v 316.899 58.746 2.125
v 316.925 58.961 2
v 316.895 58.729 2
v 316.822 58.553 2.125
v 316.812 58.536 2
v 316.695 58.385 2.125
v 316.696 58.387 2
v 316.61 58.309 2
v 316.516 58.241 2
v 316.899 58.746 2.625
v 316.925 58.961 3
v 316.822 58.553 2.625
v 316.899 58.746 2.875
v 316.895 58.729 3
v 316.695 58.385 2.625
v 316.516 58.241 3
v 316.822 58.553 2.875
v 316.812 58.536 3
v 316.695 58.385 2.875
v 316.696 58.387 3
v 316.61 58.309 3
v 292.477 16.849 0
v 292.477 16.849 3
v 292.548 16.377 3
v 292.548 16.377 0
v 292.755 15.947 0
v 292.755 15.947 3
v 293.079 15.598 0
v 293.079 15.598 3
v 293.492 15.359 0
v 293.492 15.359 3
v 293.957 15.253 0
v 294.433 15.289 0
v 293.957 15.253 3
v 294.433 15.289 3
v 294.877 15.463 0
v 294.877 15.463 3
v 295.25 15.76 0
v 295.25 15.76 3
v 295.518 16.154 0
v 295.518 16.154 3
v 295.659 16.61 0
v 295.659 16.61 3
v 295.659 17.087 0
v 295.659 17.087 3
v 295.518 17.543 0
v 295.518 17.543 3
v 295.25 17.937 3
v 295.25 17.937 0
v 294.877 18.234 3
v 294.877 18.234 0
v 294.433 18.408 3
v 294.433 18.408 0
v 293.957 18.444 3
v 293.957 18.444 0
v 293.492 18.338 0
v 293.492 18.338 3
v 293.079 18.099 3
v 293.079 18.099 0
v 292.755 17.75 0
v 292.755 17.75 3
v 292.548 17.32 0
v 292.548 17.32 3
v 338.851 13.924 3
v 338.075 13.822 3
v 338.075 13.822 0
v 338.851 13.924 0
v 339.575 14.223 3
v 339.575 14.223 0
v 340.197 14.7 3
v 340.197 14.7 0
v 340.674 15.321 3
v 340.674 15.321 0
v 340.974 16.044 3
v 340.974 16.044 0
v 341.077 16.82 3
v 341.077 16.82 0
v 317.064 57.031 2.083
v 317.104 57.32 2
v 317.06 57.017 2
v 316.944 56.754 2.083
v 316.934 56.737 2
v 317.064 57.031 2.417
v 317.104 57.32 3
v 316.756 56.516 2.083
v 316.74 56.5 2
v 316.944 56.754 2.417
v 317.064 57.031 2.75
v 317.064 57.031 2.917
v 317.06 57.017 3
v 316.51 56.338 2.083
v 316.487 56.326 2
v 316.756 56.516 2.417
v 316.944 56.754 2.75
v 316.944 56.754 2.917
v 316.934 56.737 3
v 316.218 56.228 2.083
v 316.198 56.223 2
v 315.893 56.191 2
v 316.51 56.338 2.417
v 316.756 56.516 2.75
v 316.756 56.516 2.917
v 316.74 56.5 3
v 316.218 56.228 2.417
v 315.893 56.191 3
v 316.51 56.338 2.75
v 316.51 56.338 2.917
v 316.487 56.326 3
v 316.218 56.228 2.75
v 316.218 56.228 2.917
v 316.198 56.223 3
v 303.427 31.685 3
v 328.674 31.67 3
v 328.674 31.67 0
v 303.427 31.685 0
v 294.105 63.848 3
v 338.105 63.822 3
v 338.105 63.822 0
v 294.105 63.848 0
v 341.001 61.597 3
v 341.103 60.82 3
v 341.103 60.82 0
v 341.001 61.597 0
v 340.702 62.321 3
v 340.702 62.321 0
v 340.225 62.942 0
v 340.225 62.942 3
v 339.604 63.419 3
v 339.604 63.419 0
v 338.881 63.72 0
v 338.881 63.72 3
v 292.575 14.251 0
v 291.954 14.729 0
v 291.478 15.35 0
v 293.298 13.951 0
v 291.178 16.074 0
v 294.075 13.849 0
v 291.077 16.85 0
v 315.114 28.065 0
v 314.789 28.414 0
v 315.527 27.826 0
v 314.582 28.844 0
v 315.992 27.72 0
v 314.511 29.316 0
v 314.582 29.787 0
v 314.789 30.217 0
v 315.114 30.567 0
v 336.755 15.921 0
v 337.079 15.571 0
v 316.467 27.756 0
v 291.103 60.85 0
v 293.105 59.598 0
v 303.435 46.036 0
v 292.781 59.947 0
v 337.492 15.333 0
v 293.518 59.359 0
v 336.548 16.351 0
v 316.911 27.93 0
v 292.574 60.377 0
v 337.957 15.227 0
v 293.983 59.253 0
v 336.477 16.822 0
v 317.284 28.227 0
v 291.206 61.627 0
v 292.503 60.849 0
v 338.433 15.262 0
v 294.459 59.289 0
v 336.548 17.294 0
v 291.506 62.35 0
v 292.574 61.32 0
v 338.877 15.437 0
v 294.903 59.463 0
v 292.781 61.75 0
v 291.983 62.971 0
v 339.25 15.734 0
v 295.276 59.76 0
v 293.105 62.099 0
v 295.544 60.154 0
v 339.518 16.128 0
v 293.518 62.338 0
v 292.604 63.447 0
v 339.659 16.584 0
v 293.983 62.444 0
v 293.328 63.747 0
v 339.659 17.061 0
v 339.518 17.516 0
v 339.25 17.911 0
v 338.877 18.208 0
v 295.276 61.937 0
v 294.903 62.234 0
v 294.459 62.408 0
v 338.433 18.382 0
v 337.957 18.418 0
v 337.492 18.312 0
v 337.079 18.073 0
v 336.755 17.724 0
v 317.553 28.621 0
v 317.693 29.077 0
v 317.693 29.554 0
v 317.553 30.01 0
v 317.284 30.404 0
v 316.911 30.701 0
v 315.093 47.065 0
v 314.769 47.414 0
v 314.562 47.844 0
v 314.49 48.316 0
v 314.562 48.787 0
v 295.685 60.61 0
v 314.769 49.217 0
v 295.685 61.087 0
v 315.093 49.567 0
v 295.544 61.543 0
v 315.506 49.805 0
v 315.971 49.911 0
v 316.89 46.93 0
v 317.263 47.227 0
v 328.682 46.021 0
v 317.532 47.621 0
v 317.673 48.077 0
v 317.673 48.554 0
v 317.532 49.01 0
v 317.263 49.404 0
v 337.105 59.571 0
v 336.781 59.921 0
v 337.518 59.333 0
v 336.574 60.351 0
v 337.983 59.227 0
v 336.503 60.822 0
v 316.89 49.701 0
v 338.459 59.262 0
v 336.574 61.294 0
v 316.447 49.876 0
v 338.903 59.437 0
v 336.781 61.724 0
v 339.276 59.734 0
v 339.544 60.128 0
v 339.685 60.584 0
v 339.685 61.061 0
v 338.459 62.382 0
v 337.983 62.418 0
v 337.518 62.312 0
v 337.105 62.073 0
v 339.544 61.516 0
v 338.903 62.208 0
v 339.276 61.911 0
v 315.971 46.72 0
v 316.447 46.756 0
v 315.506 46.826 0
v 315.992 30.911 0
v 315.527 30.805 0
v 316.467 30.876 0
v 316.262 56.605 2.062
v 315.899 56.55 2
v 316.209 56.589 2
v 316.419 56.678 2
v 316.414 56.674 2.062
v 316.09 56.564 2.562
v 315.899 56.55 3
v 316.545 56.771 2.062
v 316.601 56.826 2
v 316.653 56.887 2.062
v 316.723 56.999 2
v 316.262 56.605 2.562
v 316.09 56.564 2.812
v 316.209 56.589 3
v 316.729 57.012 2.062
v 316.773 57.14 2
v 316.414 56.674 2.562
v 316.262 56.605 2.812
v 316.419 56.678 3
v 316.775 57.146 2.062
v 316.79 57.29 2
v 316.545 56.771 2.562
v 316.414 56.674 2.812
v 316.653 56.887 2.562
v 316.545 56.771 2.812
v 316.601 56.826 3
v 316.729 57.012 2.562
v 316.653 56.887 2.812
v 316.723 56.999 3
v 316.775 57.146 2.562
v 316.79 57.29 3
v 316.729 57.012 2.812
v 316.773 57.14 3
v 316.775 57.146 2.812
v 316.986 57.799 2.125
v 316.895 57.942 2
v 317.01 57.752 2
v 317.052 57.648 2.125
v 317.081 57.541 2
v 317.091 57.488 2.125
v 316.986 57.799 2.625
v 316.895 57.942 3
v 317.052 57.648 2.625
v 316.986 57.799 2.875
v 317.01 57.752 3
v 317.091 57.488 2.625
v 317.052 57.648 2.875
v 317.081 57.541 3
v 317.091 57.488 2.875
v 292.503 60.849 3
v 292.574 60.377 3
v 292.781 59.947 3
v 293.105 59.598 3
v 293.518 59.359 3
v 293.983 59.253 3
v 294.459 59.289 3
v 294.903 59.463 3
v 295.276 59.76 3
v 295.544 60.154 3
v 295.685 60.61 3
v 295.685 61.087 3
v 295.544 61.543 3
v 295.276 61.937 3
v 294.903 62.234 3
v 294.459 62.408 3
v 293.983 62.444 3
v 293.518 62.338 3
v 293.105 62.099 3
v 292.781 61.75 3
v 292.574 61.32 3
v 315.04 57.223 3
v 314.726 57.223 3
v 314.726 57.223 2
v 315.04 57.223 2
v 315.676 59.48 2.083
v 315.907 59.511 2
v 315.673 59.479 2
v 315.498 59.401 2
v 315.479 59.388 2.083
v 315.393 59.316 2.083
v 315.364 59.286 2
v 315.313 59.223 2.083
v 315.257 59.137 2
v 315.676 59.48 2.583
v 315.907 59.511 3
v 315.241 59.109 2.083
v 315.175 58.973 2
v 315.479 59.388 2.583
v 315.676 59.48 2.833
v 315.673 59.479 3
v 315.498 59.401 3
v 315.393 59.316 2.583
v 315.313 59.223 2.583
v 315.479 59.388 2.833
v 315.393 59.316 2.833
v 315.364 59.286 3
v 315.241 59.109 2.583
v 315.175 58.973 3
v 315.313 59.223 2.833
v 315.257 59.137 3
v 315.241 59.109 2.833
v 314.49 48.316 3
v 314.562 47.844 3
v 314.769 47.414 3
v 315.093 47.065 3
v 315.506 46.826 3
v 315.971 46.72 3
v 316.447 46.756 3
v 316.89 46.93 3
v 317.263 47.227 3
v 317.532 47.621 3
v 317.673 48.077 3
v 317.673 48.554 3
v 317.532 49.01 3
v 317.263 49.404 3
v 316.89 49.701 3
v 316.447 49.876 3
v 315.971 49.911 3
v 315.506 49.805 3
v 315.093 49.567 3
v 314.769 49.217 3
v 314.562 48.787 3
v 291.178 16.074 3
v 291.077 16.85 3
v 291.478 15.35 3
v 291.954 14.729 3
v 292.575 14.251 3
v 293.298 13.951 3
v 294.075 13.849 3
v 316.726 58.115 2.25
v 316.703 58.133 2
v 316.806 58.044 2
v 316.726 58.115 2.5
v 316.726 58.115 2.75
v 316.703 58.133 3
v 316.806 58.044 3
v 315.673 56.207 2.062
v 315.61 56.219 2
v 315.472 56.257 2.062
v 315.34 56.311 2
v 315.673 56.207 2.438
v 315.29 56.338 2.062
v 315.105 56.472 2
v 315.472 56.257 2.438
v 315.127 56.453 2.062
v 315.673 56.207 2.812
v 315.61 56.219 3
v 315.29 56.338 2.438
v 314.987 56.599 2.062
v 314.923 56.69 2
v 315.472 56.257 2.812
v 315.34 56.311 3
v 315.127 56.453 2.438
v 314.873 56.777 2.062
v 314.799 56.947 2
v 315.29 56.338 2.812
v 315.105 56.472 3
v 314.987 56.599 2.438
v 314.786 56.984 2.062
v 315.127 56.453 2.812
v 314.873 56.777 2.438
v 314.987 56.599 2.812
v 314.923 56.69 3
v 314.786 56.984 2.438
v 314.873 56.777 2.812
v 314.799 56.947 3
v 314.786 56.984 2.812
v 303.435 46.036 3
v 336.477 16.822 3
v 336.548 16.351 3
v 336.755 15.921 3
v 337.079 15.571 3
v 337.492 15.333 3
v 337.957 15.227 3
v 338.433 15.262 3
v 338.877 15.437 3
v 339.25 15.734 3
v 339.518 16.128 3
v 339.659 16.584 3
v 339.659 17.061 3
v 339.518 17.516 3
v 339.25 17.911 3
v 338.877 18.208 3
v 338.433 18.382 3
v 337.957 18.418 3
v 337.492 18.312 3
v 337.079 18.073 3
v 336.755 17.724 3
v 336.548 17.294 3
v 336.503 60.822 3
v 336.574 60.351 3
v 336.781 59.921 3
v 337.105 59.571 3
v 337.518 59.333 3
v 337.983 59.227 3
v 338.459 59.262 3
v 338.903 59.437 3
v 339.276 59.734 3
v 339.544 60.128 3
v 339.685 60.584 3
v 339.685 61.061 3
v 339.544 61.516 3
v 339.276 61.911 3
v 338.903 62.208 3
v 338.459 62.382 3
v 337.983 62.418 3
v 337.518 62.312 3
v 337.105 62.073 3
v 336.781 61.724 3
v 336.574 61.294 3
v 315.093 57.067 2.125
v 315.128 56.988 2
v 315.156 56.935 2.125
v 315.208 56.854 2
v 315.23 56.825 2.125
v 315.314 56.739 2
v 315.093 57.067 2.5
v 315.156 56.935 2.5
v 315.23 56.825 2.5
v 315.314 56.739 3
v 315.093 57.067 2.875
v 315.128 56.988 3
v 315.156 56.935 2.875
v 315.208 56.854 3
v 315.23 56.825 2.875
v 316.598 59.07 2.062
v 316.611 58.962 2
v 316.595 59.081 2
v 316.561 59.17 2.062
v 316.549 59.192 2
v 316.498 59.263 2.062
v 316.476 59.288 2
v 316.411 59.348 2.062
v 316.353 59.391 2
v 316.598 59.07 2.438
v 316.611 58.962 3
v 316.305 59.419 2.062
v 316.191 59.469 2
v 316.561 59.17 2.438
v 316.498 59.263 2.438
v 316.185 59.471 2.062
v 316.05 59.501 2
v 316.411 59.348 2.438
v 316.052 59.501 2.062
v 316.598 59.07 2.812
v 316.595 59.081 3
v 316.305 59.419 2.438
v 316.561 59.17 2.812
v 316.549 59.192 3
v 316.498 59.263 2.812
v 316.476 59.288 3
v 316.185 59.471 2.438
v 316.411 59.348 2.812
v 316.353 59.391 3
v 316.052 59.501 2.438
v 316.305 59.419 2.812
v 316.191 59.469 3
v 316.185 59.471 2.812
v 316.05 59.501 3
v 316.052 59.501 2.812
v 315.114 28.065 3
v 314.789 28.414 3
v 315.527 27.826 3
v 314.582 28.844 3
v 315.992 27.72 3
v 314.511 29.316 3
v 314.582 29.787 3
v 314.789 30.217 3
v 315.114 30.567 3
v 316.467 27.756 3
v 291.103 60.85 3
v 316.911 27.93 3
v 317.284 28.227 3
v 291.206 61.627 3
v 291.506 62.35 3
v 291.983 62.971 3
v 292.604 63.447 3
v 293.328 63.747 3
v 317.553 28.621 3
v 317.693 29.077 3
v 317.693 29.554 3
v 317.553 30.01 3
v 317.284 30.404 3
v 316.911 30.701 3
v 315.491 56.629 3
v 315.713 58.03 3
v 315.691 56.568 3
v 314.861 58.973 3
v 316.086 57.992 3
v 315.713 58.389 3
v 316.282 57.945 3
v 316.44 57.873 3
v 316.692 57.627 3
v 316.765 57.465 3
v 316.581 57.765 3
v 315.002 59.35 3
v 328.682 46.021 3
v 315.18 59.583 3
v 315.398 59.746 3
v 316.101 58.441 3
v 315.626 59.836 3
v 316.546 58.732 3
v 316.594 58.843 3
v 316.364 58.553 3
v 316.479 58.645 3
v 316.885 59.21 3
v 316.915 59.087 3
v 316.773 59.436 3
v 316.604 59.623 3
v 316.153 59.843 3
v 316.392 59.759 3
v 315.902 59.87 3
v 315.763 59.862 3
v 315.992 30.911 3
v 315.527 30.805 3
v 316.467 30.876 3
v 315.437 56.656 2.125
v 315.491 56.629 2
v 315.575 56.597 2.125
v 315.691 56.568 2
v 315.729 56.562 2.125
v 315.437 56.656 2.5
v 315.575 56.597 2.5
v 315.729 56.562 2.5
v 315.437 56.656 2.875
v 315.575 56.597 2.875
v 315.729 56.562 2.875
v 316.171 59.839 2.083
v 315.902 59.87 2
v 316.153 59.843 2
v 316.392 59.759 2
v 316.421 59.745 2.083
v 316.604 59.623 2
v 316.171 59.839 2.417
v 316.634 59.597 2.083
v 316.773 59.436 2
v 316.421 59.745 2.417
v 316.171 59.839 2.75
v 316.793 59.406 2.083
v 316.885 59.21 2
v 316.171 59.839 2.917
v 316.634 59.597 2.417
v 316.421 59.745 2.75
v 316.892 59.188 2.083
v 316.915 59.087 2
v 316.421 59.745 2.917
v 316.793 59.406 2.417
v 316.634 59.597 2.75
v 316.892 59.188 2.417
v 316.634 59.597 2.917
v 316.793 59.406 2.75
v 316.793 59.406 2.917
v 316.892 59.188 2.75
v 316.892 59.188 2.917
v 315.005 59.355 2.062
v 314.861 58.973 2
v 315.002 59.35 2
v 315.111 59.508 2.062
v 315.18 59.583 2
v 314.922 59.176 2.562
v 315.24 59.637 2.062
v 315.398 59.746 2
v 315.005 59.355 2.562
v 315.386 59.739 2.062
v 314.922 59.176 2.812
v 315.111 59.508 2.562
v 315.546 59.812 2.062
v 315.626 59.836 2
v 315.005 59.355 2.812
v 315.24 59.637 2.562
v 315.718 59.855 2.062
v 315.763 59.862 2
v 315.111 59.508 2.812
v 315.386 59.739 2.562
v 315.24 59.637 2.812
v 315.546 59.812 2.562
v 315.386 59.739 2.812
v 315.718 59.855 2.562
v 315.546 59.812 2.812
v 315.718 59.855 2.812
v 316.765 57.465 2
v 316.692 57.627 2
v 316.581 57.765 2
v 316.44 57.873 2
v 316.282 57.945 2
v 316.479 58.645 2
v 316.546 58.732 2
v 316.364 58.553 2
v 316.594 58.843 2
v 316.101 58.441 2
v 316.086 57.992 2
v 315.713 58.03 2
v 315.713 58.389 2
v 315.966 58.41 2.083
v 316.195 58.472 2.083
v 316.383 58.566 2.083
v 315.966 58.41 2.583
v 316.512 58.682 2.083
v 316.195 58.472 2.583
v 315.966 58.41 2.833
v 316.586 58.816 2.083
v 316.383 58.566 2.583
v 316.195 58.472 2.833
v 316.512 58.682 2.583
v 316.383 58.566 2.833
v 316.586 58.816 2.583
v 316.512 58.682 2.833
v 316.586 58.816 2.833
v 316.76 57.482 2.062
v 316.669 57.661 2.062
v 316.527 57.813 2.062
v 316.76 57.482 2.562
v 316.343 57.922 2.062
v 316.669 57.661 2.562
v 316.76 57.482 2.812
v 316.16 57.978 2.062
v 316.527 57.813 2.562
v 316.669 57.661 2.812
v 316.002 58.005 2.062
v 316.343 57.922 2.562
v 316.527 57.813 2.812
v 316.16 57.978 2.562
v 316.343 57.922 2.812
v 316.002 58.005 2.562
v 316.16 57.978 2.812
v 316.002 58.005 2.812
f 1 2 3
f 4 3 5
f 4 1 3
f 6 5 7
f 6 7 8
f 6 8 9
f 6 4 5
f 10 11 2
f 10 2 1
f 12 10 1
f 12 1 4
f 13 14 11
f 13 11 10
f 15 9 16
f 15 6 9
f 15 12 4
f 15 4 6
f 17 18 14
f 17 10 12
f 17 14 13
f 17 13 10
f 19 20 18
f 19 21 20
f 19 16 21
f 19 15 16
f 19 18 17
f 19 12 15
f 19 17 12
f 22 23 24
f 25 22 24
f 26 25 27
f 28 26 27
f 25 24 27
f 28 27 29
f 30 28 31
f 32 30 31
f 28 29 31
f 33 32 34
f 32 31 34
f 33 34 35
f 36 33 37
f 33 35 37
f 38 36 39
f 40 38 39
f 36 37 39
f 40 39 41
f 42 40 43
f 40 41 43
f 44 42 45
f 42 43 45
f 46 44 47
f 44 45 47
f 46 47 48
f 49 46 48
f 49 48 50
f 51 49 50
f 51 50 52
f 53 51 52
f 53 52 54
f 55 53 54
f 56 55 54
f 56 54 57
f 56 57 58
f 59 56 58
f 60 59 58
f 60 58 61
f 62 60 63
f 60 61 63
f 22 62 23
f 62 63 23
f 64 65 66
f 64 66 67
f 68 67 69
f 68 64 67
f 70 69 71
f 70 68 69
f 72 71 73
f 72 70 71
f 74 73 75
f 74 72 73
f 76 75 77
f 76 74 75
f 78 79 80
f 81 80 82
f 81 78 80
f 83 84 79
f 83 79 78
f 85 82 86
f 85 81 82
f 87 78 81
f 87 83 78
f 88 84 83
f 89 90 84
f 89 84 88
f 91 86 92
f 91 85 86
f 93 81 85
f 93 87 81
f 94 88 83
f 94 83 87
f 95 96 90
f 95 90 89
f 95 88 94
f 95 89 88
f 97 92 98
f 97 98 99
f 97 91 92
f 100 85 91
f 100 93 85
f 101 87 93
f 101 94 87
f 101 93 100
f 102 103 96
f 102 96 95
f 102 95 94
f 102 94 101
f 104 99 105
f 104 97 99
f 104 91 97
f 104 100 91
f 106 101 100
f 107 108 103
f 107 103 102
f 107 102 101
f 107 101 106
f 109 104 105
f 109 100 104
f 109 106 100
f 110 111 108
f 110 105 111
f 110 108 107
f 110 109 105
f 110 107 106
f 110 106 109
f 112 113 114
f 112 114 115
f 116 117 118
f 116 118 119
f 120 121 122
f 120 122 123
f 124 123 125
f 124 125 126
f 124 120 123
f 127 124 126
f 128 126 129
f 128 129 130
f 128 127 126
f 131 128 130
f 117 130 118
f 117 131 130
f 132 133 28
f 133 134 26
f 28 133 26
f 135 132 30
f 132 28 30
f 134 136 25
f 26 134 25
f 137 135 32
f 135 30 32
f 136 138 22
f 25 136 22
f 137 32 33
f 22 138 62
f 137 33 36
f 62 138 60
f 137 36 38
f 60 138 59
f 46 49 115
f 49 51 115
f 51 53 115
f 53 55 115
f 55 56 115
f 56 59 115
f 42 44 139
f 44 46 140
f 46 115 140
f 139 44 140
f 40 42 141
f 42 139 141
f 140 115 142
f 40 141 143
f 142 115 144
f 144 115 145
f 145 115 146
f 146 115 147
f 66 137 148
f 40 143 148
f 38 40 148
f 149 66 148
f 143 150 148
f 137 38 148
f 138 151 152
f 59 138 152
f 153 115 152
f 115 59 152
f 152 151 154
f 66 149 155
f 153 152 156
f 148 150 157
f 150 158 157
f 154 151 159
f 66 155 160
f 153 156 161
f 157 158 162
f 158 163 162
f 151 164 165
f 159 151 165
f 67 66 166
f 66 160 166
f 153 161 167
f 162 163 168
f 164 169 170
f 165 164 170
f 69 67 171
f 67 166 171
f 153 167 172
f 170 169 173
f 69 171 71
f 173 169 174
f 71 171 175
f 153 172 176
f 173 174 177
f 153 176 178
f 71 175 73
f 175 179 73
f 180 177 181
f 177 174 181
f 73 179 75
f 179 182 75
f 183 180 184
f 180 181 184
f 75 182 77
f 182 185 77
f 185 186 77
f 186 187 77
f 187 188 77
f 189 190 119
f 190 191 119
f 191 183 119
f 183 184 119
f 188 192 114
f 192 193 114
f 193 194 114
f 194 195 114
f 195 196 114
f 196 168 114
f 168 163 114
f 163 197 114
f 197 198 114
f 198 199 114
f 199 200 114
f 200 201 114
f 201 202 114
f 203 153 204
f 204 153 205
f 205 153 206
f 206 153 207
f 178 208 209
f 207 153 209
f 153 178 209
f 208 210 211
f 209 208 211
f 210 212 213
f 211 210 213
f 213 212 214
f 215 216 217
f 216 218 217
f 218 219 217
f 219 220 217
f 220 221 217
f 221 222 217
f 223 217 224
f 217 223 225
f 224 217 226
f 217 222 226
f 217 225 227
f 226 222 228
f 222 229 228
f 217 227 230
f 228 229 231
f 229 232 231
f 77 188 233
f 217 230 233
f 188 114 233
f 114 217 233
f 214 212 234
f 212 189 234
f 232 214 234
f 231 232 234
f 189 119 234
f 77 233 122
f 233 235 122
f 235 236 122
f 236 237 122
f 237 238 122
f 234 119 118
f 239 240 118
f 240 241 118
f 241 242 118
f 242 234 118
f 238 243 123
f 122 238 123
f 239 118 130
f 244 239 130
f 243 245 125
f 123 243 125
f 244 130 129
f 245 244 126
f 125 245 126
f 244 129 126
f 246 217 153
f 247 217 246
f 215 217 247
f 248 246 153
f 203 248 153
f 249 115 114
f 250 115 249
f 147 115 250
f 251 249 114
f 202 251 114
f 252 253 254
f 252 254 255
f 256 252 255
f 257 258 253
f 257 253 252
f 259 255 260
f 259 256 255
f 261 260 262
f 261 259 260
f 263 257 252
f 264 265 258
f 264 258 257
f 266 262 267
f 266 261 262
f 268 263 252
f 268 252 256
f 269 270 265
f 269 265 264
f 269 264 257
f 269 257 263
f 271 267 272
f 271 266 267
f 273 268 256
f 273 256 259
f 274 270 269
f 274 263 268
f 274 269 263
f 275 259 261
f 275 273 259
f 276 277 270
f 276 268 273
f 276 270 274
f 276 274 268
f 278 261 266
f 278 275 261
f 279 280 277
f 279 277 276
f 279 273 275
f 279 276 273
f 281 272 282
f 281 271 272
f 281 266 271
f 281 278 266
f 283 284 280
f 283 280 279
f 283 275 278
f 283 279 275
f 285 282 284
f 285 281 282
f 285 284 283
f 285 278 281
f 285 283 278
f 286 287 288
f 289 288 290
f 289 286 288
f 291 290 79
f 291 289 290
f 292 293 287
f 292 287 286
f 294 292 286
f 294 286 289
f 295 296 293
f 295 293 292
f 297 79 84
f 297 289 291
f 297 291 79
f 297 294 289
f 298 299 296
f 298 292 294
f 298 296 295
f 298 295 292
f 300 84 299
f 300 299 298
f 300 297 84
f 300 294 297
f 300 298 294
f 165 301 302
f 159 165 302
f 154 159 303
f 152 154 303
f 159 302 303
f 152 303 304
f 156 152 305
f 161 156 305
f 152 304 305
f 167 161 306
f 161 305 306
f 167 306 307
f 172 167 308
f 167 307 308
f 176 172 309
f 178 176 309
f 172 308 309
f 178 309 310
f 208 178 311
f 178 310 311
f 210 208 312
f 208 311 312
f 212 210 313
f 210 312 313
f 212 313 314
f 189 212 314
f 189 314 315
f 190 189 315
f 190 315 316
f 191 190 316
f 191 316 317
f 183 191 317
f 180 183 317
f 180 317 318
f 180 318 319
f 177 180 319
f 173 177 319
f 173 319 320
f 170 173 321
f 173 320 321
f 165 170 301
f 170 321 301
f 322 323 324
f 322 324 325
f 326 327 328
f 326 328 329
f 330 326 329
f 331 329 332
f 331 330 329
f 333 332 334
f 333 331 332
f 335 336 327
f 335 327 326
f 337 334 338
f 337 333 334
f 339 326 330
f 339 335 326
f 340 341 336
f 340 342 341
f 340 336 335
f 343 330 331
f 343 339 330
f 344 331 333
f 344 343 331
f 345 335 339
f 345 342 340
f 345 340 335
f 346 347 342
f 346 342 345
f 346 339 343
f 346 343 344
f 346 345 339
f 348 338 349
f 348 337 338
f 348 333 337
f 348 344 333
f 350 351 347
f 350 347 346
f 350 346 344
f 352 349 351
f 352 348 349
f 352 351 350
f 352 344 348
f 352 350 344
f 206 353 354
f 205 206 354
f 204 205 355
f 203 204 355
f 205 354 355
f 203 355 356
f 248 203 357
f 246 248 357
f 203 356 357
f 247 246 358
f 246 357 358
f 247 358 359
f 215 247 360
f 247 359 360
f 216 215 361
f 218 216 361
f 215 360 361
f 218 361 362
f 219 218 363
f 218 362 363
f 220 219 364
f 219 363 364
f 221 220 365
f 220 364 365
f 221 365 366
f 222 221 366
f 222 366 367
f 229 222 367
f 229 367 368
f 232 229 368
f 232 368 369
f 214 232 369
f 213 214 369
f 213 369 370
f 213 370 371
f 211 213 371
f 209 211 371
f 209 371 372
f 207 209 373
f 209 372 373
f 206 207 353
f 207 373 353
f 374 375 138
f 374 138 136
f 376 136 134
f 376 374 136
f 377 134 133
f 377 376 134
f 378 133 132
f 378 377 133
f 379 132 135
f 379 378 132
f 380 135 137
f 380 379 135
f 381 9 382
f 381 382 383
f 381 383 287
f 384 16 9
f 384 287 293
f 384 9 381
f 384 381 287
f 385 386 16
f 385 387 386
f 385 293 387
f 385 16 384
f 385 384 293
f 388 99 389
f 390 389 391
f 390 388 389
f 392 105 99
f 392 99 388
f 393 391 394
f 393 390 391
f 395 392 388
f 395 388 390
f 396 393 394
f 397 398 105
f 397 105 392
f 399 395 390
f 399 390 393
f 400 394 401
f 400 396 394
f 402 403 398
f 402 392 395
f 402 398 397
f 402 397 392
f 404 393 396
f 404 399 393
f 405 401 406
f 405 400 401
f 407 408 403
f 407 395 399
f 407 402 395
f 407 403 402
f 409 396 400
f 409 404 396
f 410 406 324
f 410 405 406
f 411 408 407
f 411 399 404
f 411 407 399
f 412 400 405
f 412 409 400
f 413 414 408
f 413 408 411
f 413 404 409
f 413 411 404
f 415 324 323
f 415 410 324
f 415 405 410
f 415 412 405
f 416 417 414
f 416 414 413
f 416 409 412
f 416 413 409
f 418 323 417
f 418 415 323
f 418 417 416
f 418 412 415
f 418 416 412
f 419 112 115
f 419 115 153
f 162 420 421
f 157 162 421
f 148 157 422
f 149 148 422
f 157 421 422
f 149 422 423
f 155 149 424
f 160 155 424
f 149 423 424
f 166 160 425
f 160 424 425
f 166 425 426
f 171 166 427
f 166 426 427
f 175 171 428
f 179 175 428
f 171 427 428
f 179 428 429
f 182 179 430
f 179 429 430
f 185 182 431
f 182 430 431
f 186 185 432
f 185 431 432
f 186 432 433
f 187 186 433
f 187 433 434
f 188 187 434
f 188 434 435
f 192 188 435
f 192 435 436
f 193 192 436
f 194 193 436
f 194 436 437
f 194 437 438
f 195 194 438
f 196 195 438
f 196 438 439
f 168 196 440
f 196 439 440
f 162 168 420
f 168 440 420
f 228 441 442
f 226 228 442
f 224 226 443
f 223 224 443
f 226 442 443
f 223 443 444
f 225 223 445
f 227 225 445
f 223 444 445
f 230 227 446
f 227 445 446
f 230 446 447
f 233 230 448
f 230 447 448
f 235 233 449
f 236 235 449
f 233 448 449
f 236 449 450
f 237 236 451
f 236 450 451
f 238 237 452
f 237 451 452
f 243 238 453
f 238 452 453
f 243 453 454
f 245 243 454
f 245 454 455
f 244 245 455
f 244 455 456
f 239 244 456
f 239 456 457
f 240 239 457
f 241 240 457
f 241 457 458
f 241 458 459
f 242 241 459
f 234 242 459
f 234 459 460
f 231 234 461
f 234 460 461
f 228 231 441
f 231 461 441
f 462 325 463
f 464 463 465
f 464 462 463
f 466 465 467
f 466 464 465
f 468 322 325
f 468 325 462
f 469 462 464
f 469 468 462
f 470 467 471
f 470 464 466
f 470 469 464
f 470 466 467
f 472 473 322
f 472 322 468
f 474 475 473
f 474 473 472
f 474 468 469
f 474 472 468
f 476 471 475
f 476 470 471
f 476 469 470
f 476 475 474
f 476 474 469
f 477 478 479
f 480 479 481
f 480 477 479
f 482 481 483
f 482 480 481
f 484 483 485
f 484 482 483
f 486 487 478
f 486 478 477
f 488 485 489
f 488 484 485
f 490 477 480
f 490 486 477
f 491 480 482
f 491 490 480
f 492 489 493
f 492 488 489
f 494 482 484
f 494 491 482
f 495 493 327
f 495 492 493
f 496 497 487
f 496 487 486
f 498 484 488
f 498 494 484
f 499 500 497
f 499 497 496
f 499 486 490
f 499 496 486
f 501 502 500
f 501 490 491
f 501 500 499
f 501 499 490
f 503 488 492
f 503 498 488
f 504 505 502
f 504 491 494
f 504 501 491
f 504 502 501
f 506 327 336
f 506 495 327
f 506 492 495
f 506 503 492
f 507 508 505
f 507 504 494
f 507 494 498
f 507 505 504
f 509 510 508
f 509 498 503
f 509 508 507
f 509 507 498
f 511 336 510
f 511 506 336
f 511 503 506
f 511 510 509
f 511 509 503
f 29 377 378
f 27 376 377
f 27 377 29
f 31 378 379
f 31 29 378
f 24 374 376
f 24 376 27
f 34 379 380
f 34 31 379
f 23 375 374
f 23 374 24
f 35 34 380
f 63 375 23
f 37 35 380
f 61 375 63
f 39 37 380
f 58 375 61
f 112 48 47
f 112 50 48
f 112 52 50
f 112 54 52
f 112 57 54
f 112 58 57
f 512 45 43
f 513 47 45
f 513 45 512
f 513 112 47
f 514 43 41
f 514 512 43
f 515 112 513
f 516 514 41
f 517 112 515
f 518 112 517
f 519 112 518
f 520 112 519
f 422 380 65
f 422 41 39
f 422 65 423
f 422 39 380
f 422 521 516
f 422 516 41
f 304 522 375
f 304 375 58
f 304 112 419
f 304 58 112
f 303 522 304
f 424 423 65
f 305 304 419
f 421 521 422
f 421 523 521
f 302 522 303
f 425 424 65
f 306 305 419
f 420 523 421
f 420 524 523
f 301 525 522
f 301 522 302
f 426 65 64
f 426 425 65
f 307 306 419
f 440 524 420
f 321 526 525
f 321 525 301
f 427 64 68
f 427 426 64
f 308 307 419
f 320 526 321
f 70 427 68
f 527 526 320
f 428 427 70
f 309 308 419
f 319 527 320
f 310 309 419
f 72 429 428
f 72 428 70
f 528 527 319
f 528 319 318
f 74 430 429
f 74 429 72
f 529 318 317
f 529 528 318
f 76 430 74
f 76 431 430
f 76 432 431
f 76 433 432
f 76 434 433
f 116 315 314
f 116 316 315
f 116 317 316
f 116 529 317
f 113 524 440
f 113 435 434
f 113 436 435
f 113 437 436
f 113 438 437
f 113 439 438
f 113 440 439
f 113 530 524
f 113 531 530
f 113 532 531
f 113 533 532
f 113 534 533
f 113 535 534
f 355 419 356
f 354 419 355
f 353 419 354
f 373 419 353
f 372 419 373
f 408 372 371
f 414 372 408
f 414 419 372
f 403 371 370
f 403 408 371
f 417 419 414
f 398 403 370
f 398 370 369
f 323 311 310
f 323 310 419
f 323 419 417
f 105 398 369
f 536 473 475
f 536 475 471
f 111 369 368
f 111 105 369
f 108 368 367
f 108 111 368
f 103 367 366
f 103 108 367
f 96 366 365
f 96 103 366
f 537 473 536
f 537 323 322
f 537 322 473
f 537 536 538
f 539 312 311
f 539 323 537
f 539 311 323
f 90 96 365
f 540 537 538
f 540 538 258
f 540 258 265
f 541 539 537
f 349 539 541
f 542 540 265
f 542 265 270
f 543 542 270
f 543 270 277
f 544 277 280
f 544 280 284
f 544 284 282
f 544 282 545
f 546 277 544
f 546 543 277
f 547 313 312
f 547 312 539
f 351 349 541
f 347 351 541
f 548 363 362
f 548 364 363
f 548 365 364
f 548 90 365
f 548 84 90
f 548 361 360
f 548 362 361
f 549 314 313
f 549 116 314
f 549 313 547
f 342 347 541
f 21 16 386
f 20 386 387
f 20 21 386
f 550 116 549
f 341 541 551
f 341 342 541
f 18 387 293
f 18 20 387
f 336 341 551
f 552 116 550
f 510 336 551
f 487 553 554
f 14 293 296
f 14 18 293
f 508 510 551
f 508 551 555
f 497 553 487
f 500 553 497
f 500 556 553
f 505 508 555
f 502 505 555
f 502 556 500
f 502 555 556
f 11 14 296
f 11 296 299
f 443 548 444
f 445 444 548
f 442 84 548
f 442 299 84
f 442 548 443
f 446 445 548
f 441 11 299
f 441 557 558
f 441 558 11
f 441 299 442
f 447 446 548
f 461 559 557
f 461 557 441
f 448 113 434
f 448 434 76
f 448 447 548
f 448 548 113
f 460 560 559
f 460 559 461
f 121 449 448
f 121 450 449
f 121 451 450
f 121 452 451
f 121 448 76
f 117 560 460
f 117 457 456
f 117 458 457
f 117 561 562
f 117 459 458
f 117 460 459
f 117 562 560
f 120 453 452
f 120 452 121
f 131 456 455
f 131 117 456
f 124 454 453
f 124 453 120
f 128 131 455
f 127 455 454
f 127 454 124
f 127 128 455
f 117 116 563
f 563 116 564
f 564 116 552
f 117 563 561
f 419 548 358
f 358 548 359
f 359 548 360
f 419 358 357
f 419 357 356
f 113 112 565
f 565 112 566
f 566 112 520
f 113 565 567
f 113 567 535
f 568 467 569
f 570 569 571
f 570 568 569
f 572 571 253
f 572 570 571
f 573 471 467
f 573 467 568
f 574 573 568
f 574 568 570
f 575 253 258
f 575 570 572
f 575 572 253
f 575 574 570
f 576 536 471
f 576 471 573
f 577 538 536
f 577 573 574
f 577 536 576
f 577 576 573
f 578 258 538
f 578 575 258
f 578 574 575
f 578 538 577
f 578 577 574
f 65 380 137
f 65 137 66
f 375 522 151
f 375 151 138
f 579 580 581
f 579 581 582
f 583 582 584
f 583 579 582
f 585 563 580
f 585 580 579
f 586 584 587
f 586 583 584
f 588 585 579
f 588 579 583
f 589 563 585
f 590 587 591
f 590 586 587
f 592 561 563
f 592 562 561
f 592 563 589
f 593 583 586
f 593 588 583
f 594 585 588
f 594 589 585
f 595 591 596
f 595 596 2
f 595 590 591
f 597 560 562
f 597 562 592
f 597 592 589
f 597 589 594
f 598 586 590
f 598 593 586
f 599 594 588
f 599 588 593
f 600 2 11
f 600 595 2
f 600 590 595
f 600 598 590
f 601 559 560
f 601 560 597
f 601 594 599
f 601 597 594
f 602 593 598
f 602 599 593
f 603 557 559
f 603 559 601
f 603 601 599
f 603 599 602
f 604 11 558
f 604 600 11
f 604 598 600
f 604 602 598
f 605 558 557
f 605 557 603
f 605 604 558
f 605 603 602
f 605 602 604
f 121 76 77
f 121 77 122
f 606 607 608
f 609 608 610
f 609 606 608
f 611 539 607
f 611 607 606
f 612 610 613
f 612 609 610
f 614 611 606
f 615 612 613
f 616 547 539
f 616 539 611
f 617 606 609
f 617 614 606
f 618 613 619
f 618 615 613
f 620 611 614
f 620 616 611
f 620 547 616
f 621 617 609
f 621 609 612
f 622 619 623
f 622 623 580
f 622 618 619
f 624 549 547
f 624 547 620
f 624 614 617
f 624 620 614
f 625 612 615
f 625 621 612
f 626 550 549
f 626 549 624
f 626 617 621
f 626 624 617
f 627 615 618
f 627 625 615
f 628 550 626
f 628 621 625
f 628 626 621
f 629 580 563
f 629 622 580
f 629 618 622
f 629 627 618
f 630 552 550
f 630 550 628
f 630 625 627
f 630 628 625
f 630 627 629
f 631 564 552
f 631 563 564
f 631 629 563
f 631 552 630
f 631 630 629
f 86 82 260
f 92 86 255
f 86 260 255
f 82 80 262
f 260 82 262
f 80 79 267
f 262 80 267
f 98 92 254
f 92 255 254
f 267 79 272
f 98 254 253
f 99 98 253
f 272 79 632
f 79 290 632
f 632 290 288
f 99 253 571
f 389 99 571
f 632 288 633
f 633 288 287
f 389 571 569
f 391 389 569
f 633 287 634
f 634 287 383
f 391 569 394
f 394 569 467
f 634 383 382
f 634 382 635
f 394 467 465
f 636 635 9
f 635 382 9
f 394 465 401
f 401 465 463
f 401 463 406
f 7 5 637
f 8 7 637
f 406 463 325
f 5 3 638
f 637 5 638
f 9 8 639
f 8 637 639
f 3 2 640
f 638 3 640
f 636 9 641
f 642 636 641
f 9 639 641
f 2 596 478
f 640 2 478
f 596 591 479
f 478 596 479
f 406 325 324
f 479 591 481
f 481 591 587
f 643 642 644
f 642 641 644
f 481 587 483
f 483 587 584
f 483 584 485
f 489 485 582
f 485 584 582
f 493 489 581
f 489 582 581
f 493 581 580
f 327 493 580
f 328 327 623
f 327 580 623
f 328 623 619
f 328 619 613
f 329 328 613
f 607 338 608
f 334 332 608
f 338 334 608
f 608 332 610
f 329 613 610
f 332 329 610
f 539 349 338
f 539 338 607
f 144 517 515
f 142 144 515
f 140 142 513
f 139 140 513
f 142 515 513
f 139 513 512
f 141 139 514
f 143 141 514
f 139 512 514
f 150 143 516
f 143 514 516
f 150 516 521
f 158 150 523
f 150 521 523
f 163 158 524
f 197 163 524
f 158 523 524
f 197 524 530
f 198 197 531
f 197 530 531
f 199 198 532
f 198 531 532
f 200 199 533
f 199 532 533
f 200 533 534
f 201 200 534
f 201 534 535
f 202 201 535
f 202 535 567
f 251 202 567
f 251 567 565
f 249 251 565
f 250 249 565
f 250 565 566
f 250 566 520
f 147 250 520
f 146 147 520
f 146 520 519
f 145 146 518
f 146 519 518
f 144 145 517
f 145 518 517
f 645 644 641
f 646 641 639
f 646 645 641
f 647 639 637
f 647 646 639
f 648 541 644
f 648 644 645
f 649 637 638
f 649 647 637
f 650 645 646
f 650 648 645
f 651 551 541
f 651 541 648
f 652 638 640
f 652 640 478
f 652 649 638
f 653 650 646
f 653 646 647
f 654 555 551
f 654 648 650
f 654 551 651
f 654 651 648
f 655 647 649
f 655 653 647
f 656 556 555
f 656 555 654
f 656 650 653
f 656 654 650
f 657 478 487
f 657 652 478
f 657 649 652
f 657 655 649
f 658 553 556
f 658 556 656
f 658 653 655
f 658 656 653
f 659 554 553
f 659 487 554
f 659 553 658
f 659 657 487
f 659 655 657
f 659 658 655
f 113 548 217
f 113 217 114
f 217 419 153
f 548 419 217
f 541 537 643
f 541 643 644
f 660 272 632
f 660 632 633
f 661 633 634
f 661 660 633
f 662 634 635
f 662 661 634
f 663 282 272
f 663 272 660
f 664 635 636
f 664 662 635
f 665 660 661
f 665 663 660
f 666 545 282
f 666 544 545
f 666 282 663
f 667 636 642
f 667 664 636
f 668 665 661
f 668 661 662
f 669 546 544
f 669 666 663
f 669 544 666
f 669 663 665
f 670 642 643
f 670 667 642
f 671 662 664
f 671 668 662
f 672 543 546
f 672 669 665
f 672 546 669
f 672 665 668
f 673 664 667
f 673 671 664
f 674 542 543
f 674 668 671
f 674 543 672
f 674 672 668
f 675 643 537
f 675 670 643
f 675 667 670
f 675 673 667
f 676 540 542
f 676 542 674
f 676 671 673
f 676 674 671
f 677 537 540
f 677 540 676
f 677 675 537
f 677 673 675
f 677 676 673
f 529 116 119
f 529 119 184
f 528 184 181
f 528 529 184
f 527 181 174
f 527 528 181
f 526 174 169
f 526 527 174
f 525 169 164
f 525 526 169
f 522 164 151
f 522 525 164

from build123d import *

# Parameters (mm, degrees)
SKETCH_1_R          = 1.6
EXTRUDE_1_DEPTH     = 3
CUT_EXTRUDE_1_DEPTH = 1


with BuildPart() as part:
    # 草图1 → 凸台-拉伸1 (new body)
    with BuildSketch(Plane.XY.offset(3)):
        with BuildLine():
            Line((291.102941136, 60.850305737), (291.076707349, 16.850305738))
            ThreePointArc((291.076707349, 16.850305738), (291.954101097, 14.728512603), (294.07484648, 13.848589358))
            Line((294.07484648, 13.848589358), (338.074844131, 13.822355573))
            ThreePointArc((338.074844131, 13.822355573), (340.196637266, 14.699749321), (341.07656051, 16.820494704))
            Line((341.07656051, 16.820494704), (341.102794297, 60.820495366))
            ThreePointArc((341.102794297, 60.820495366), (340.22540099, 62.942287436), (338.104656671, 63.822210239))
            Line((338.104656671, 63.822210239), (294.104656671, 63.848444025))
            ThreePointArc((294.104656671, 63.848444025), (291.982864133, 62.971050524), (291.102941136, 60.850305737))
        make_face()
        with Locations(Location((338.076632755, 16.822283328, 0), (0, 0, 180))):
            Circle(SKETCH_1_R, mode=Mode.SUBTRACT)
        with Locations(Location((294.102868048, 60.848517113, 0), (0, 0, 180))):
            Circle(SKETCH_1_R, mode=Mode.SUBTRACT)
        with Locations(Location((338.102868048, 60.822283989, 0), (0, 0, 180))):
            Circle(SKETCH_1_R, mode=Mode.SUBTRACT)
        with Locations(Location((294.076635104, 16.848517113, 0), (0, 0, 180))):
            Circle(SKETCH_1_R, mode=Mode.SUBTRACT)
        with Locations(Location((316.111204471, 29.315652621, 0), (0, 0, 180))):
            Circle(SKETCH_1_R, mode=Mode.SUBTRACT)
        with Locations(Location((316.090486738, 48.315652621, 0), (0, 0, 180))):
            Circle(SKETCH_1_R, mode=Mode.SUBTRACT)
        Polygon((303.43545239, 46.035704845), (328.682343893, 46.020652083), (328.673787658, 31.669910181), (303.426896156, 31.684962944), align=None, mode=Mode.SUBTRACT)
    extrude(amount=-EXTRUDE_1_DEPTH)

    # 草图2 → 切除-拉伸1 (cut)
    with BuildSketch(Plane.XY.offset(3)):
        with BuildLine():
            Line((315.174630784, 58.972726271), (314.86052822, 58.972726271))
            add(Edge.make_bspline(
                [(314.86052822, 58.972726271), (314.869037771, 59.007958755), (314.885673246, 59.07683538), (314.92037082, 59.17524264), (314.958170075, 59.268366162), (315.003559179, 59.354462236), (315.053067934, 59.435261138), (315.109790655, 59.508930263), (315.171110378, 59.577343228), (315.238935327, 59.638056466), (315.310063989, 59.693034195), (315.385498608, 59.739909252), (315.463721502, 59.780233405), (315.545274635, 59.813453637), (315.630400807, 59.838479161), (315.71833043, 59.856635966), (315.80929393, 59.868427081), (315.871041521, 59.869577844), (315.902395207, 59.870162169)],
                knots=[0, 0, 0, 0, 1.162005537, 2.271625781, 3.343758855, 4.383309926, 5.390229558, 6.379919256, 7.361854164, 8.333198761, 9.295911338, 10.242430842, 11.177959212, 12.116337295, 13.062827104, 14.020064771, 14.994644689, 16, 16, 16, 16], degree=3))
            add(Edge.make_bspline(
                [(315.902395207, 59.870162169), (315.948077949, 59.868782938), (316.03844696, 59.866054563), (316.171210007, 59.841140127), (316.299236826, 59.801714994), (316.421126074, 59.747241267), (316.534344507, 59.680053954), (316.635080693, 59.600089217), (316.721969204, 59.508889915), (316.794863582, 59.408157351), (316.851938581, 59.300501842), (316.894024954, 59.189701685), (316.919646635, 59.076019713), (316.922967192, 58.999262434), (316.924630784, 58.960807201)],
                knots=[0, 0, 0, 0, 1.083050992, 2.142477498, 3.193116406, 4.255571735, 5.30263384, 6.308962982, 7.297363603, 8.282367274, 9.249857812, 10.179914175, 11.08814088, 12, 12, 12, 12], degree=3))
            add(Edge.make_bspline(
                [(316.924630784, 58.960807201), (316.923467193, 58.923800406), (316.921190226, 58.851383852), (316.90185652, 58.745662354), (316.869320257, 58.646020754), (316.824250495, 58.552039592), (316.765908945, 58.464314752), (316.695236248, 58.382648861), (316.611733586, 58.306679703), (316.548454648, 58.26316023), (316.515876778, 58.240755117)],
                knots=[0, 0, 0, 0, 1.024540389, 2.004866551, 2.965041327, 3.920577974, 4.882998113, 5.874504559, 6.905732034, 8, 8, 8, 8], degree=3))
            add(Edge.make_bspline(
                [(316.515876778, 58.240755117), (316.553108532, 58.222776946), (316.626875406, 58.187156988), (316.727425936, 58.117301231), (316.818703811, 58.036644883), (316.86960753, 57.97370223), (316.895183669, 57.942077233)],
                knots=[0, 0, 0, 0, 1.015518401, 2.012035669, 3.001164323, 4, 4, 4, 4], degree=3))
            add(Edge.make_bspline(
                [(316.895183669, 57.942077233), (316.912025011, 57.919019481), (316.945431907, 57.873281565), (316.986667441, 57.799745139), (317.024076555, 57.725393649), (317.053226774, 57.648234243), (317.075800641, 57.56916123), (317.091936674, 57.488038834), (317.101960814, 57.404800811), (317.103396366, 57.348488331), (317.104117964, 57.320182201)],
                knots=[0, 0, 0, 0, 1.025084078, 2.033381695, 3.024893161, 4.013698104, 4.991890475, 5.976764909, 6.982997093, 8, 8, 8, 8], degree=3))
            add(Edge.make_bspline(
                [(317.104117964, 57.320182201), (317.10232345, 57.27117248), (317.098742868, 57.173383678), (317.066738794, 57.028908956), (317.017125553, 56.887683454), (316.946668617, 56.752608615), (316.860801108, 56.626228234), (316.758643784, 56.513151925), (316.641357376, 56.41595332), (316.510551727, 56.334743092), (316.368834598, 56.26982517), (316.217259006, 56.224767727), (316.058008952, 56.195421727), (315.948801655, 56.192274859), (315.893280624, 56.190674989)],
                knots=[0, 0, 0, 0, 0.955779014, 1.907060117, 2.875433937, 3.871313158, 4.872415639, 5.851225146, 6.836215519, 7.83643374, 8.849228613, 9.86973379, 10.916971861, 12, 12, 12, 12], degree=3))
            add(Edge.make_bspline(
                [(315.893280624, 56.190674989), (315.855861324, 56.191543202), (315.782232618, 56.193251557), (315.67398912, 56.204930158), (315.570667421, 56.226260163), (315.472127823, 56.254963468), (315.378282786, 56.291355211), (315.289418681, 56.336673909), (315.204988788, 56.389985411), (315.125789837, 56.451918998), (315.051831269, 56.521200338), (314.985078545, 56.599059348), (314.924418752, 56.684056752), (314.871476113, 56.777179808), (314.82383916, 56.877225066), (314.784658204, 56.985473564), (314.750172635, 57.100957586), (314.734139171, 57.181435326), (314.725912835, 57.222726271)],
                knots=[0, 0, 0, 0, 1.048658725, 2.063410685, 3.046034179, 4.001477787, 4.936774919, 5.862367409, 6.792675028, 7.730719943, 8.675894397, 9.627829632, 10.600096036, 11.597688215, 12.626045268, 13.701542398, 14.82072376, 16, 16, 16, 16], degree=3))
            Line((314.725912835, 57.222726271), (315.040015399, 57.222726271))
            add(Edge.make_bspline(
                [(315.040015399, 57.222726271), (315.048198691, 57.195777258), (315.064115904, 57.143359086), (315.091210202, 57.067918781), (315.122078474, 56.998760727), (315.155193032, 56.935377606), (315.189971478, 56.877145203), (315.228886403, 56.825603334), (315.269055549, 56.778488132), (315.299334902, 56.75194352), (315.314154021, 56.738952233)],
                knots=[0, 0, 0, 0, 1.198163088, 2.33053128, 3.407730985, 4.417276592, 5.372219308, 6.28897303, 7.162600585, 8, 8, 8, 8], degree=3))
            add(Edge.make_bspline(
                [(315.314154021, 56.738952233), (315.333750598, 56.723843899), (315.372883261, 56.693673867), (315.436651492, 56.655172239), (315.503716378, 56.621811213), (315.575531052, 56.596327518), (315.650545823, 56.574749857), (315.729973188, 56.560629338), (315.813112405, 56.550941166), (315.869880168, 56.550086235), (315.898889598, 56.549649348)],
                knots=[0, 0, 0, 0, 0.946170439, 1.889420265, 2.845303464, 3.807233317, 4.801018734, 5.828864929, 6.890507805, 8, 8, 8, 8], degree=3))
            add(Edge.make_bspline(
                [(315.898889598, 56.549649348), (315.931643101, 56.550265253), (315.995689748, 56.551469603), (316.089144607, 56.56254531), (316.178052055, 56.578675723), (316.26142498, 56.603588706), (316.340355488, 56.634369558), (316.413737137, 56.673017963), (316.482533244, 56.718362685), (316.545862649, 56.769901843), (316.602808157, 56.826323338), (316.65294767, 56.885336409), (316.695572331, 56.946692239), (316.729955909, 57.01073036), (316.75710646, 57.077185589), (316.77558966, 57.146244418), (316.788441175, 57.217341684), (316.789487788, 57.265670653), (316.790015399, 57.290033964)],
                knots=[0, 0, 0, 0, 1.217147791, 2.380027433, 3.494444702, 4.572153297, 5.609568379, 6.639424714, 7.649109417, 8.668170816, 9.669597737, 10.625200337, 11.543417969, 12.441394052, 13.322311151, 14.205496177, 15.095365482, 16, 16, 16, 16], degree=3))
            add(Edge.make_bspline(
                [(316.790015399, 57.290033964), (316.788485098, 57.322645302), (316.785432109, 57.387705711), (316.76212353, 57.483423285), (316.723784666, 57.575646697), (316.670112154, 57.662802487), (316.604776426, 57.743578389), (316.528411519, 57.815649871), (316.440383291, 57.875119963), (316.359363422, 57.916208619), (316.287598265, 57.944245694), (316.226182881, 57.962920659), (316.157426277, 57.978734314), (316.082159928, 57.993446586), (315.999816712, 58.005967934), (315.910486274, 58.01640975), (315.814150512, 58.024764791), (315.747459346, 58.028495886), (315.713092323, 58.030418579)],
                knots=[0, 0, 0, 0, 1.07054697, 2.135767047, 3.216561865, 4.33974944, 5.486079747, 6.621378074, 7.775625952, 8.963672916, 9.598146892, 10.304877434, 11.070270905, 11.915000392, 12.823868403, 13.805723172, 14.86925407, 16, 16, 16, 16], degree=3))
            Line((315.713092323, 58.030418579), (315.713092323, 58.389392938))
            add(Edge.make_bspline(
                [(315.713092323, 58.389392938), (315.756393488, 58.390127742), (315.841209835, 58.391567042), (315.96510414, 58.408975052), (316.083577452, 58.43305568), (316.194004194, 58.469940872), (316.294652907, 58.512781169), (316.381972509, 58.562633379), (316.454739656, 58.618048128), (316.512600728, 58.679880737), (316.556129957, 58.746195785), (316.587956754, 58.815312442), (316.60675708, 58.887836503), (316.609266747, 58.937331171), (316.61052822, 58.962209444)],
                knots=[0, 0, 0, 0, 1.321986639, 2.589447074, 3.816329219, 5.01088745, 6.139805852, 7.153945165, 8.075214402, 8.924034688, 9.728124013, 10.488707548, 11.240355623, 12, 12, 12, 12], degree=3))
            add(Edge.make_bspline(
                [(316.61052822, 58.962209444), (316.610113809, 58.980487189), (316.609289358, 59.016849897), (316.59889208, 59.069974965), (316.583268039, 59.121475911), (316.56178831, 59.171133721), (316.533038111, 59.218603995), (316.498632125, 59.264291444), (316.457664024, 59.307935223), (316.410718577, 59.348615543), (316.360306772, 59.38738478), (316.305056997, 59.420298417), (316.246635123, 59.448443479), (316.184976468, 59.471652981), (316.119880938, 59.489112269), (316.05165438, 59.501648111), (315.980166696, 59.509485766), (315.931394964, 59.510614181), (315.906601938, 59.51118781)],
                knots=[0, 0, 0, 0, 0.884392785, 1.759457502, 2.611959086, 3.489218968, 4.37281399, 5.2945488, 6.255912374, 7.266815255, 8.301784654, 9.332968512, 10.37626691, 11.440494194, 12.520033166, 13.637162961, 14.798855837, 16, 16, 16, 16], degree=3))
            add(Edge.make_bspline(
                [(315.906601938, 59.51118781), (315.86675027, 59.509796448), (315.788910694, 59.507078794), (315.676695777, 59.483275781), (315.572376443, 59.445297697), (315.492637776, 59.399964678), (315.433755202, 59.355214244), (315.391678264, 59.316131858), (315.350357753, 59.272699034), (315.312512076, 59.222240659), (315.2742381, 59.168173868), (315.239393538, 59.107750187), (315.205533846, 59.042545793), (315.185131296, 58.996450158), (315.174630784, 58.972726271)],
                knots=[0, 0, 0, 0, 1.472543308, 2.876219568, 4.221790263, 5.565193594, 6.249813518, 6.953379497, 7.687249741, 8.463570142, 9.283606569, 10.136032583, 11.040678096, 12, 12, 12, 12], degree=3))
        make_face()
    extrude(amount=-CUT_EXTRUDE_1_DEPTH, mode=Mode.SUBTRACT)


solid = part.part
